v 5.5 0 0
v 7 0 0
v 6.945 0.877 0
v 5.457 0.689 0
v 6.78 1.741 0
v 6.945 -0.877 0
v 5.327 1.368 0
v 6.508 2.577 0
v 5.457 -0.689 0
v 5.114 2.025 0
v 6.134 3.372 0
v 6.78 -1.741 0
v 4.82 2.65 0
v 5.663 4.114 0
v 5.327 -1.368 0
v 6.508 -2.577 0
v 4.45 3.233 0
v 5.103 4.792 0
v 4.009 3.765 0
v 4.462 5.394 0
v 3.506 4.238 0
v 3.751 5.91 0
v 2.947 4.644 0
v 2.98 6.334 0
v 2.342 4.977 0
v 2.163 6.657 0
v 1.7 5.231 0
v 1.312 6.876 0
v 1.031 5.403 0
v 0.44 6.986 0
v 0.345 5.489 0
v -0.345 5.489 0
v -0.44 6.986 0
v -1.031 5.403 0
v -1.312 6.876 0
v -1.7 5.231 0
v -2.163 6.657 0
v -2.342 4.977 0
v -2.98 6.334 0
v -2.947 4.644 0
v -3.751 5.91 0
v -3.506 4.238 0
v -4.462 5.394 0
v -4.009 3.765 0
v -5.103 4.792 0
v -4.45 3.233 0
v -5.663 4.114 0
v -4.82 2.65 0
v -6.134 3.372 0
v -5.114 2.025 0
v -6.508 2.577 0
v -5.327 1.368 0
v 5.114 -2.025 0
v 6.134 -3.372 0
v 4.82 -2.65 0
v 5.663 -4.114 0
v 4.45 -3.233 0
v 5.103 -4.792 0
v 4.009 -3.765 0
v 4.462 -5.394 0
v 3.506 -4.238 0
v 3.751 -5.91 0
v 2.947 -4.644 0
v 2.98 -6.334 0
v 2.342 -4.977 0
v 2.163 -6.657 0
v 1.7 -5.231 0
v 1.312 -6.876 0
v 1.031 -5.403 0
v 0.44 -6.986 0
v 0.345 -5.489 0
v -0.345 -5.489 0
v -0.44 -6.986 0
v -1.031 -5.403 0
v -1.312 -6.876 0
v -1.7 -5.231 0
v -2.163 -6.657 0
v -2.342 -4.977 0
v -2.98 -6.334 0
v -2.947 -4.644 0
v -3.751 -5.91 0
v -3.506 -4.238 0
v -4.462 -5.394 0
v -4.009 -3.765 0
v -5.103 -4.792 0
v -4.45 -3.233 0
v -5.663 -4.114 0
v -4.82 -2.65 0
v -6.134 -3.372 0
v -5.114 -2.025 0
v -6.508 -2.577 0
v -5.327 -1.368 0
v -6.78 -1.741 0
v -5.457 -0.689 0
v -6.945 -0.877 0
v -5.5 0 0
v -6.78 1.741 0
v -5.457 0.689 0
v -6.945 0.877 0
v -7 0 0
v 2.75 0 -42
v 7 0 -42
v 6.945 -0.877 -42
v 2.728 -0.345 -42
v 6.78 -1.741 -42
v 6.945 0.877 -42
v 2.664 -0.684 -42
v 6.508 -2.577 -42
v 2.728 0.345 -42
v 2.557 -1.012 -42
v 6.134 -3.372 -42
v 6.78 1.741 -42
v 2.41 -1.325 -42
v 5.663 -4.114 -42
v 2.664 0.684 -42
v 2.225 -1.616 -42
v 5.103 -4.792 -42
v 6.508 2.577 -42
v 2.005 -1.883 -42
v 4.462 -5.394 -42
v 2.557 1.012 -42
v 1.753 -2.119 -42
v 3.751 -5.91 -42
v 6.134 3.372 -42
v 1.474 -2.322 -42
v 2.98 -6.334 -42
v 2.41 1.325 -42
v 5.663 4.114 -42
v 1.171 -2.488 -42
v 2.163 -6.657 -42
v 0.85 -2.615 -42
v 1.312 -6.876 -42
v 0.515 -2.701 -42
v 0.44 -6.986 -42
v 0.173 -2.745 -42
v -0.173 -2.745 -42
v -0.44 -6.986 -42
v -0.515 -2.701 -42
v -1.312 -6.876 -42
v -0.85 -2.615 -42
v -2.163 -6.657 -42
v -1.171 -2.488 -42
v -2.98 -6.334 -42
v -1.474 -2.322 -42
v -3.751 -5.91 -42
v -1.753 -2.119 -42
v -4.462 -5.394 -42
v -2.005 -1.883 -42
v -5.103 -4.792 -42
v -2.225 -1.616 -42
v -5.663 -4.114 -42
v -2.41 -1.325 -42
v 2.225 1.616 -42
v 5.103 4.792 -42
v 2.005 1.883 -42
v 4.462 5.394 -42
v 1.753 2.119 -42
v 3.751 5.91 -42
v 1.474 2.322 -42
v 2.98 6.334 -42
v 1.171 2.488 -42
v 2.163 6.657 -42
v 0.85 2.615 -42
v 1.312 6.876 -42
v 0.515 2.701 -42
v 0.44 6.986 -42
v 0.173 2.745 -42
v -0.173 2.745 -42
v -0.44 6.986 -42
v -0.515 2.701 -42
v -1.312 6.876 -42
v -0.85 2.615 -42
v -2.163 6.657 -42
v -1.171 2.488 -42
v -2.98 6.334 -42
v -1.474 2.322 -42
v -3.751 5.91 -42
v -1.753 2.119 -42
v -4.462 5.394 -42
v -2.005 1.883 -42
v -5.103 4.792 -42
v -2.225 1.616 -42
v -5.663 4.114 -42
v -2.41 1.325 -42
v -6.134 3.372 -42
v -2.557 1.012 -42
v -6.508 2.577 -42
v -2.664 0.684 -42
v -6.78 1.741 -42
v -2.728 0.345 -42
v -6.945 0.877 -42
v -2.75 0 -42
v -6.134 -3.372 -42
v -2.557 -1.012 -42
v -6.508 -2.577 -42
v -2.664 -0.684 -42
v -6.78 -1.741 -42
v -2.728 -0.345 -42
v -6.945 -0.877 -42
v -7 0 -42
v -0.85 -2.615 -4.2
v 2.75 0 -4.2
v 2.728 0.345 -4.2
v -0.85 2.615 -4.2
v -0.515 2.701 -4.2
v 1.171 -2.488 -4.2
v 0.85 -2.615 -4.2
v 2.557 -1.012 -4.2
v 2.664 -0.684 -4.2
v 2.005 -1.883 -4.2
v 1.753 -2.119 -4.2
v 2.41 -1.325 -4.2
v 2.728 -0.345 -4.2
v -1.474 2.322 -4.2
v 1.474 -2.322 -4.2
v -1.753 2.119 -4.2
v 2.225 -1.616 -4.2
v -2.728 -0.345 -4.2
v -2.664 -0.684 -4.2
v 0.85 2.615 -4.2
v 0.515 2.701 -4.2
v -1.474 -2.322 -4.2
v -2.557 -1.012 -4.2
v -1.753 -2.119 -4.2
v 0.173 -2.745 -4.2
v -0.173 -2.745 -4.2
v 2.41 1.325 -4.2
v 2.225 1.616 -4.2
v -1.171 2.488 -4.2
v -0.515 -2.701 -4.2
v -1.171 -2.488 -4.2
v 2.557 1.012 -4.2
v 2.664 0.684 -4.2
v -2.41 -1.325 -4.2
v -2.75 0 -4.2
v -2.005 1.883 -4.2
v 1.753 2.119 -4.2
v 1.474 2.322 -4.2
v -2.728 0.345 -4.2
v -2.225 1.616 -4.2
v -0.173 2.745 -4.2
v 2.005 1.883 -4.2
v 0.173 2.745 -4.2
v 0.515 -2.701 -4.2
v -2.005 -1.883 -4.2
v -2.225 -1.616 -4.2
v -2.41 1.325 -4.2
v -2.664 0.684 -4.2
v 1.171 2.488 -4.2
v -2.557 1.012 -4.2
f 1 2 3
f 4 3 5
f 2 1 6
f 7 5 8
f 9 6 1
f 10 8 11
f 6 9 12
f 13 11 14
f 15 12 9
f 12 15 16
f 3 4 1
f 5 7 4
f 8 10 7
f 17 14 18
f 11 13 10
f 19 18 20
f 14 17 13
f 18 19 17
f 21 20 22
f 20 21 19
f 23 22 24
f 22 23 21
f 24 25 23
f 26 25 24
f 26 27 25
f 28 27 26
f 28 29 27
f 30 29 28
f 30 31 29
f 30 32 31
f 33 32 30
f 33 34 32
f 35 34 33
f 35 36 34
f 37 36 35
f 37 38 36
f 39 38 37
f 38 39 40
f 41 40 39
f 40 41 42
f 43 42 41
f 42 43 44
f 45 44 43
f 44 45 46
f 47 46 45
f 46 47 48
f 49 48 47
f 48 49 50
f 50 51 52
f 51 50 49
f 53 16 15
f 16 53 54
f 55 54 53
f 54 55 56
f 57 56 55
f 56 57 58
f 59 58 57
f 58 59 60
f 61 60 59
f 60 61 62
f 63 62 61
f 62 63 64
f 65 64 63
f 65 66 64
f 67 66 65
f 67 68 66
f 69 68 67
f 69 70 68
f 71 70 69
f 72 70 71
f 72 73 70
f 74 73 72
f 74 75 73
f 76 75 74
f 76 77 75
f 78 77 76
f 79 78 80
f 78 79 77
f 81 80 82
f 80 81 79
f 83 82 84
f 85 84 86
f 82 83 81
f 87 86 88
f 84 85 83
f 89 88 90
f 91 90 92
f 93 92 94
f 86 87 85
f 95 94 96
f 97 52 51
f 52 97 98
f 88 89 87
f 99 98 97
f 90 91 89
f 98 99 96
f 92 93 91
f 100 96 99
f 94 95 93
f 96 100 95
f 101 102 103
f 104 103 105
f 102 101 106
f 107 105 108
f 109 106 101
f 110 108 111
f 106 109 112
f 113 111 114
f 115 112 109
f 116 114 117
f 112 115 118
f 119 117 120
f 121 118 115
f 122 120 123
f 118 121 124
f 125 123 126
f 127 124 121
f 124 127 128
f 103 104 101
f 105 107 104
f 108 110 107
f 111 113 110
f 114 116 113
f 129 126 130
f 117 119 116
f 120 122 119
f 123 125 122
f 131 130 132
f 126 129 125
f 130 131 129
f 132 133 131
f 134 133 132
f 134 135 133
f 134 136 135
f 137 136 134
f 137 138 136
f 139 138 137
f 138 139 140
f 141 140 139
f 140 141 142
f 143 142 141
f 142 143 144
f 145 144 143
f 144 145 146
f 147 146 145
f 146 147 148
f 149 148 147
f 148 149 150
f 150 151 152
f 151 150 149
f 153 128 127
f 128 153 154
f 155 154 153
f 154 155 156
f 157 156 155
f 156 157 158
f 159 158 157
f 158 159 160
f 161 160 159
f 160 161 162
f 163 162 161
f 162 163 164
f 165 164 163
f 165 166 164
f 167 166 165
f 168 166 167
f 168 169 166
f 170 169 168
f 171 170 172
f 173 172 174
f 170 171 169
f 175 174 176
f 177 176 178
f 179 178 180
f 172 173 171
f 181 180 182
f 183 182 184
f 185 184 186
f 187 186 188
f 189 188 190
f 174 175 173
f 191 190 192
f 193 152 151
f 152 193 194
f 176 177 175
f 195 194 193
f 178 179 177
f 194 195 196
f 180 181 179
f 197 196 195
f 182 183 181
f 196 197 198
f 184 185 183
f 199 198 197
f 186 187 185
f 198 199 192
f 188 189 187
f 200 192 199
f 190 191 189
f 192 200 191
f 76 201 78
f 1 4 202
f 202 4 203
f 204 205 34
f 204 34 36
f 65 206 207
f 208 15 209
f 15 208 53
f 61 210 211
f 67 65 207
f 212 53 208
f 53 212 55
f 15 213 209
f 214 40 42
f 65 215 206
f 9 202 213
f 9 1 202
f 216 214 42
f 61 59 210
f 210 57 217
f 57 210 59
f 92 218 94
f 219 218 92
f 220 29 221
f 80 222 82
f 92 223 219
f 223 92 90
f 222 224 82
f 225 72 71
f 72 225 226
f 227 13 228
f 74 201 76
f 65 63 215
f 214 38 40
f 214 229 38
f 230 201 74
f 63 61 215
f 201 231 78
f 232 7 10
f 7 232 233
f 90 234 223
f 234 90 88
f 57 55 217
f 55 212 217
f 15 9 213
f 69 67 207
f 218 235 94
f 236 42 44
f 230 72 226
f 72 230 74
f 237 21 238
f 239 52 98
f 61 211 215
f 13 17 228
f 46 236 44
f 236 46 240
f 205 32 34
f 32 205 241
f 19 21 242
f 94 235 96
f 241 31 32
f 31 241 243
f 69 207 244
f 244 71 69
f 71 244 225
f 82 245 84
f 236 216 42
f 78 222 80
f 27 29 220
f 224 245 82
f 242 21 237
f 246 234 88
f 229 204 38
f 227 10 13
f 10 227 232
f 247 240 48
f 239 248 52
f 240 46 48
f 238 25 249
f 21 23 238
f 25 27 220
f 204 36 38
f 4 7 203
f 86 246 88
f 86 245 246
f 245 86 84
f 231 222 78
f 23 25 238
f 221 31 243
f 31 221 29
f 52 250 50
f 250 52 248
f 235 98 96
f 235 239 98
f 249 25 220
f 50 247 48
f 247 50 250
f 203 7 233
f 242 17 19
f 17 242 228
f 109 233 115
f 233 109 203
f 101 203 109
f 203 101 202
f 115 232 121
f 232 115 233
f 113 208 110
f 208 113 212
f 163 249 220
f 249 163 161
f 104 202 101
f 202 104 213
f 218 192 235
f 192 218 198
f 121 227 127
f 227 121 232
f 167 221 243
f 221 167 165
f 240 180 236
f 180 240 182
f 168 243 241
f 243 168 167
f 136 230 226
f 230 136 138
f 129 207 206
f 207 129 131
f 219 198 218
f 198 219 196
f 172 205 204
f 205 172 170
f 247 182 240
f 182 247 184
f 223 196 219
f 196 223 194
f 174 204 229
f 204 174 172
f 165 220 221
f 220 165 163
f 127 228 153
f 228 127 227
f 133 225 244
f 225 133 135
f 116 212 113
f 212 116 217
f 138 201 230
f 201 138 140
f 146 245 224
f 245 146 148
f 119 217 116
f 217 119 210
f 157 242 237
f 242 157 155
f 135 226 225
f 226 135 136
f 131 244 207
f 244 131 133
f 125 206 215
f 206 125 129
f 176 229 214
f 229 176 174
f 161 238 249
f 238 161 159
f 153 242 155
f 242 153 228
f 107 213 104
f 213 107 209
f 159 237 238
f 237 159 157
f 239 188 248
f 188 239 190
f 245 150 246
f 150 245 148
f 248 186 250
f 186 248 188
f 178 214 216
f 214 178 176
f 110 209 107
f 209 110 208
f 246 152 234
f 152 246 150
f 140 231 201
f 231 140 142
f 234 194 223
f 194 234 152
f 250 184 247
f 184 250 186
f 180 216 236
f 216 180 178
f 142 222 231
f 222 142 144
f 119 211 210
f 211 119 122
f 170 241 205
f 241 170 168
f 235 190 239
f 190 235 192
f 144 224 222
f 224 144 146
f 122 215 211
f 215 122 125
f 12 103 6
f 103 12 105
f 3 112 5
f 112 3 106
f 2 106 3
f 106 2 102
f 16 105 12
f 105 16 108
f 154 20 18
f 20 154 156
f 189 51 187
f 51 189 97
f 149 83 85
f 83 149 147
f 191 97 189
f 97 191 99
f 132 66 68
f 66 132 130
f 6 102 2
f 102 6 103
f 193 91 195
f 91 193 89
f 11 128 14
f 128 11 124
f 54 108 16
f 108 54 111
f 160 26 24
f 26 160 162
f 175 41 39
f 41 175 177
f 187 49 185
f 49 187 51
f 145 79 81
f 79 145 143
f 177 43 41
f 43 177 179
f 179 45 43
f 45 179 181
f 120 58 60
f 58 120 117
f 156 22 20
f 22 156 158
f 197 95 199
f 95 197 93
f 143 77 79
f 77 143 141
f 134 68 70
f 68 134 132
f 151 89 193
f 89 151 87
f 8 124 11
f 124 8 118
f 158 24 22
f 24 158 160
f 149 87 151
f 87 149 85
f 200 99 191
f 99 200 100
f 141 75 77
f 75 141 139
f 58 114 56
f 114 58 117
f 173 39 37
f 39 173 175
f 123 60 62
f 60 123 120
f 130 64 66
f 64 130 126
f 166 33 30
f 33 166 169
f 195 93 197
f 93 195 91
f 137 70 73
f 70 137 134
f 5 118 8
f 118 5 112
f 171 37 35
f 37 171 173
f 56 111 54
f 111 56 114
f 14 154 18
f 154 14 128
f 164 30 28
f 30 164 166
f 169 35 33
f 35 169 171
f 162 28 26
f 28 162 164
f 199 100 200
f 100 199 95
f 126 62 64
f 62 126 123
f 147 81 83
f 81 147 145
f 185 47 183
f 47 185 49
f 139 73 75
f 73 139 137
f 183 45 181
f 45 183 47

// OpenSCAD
$fn = 50;


difference() {
	union() {
		translate(v = [0, 0, -42.0000000000]) {
			cylinder(h = 42, r = 7.0000000000);
		}
		cylinder(h = 0, r = 17.0000000000);
	}
	union() {
		translate(v = [0, 0, 0]) {
			rotate(a = [0, 0, 0]) {
				difference() {
					union() {
						#translate(v = [0, 0, -42.0000000000]) {
							cylinder(h = 42, r = 2.2500000000);
						}
						#translate(v = [0, 0, -4.2000000000]) {
							cylinder(h = 4.2000000000, r1 = 2.7500000000, r2 = 5.5000000000);
						}
						#translate(v = [0, 0, -42.0000000000]) {
							cylinder(h = 42, r = 2.7500000000);
						}
						#translate(v = [0, 0, -42.0000000000]) {
							cylinder(h = 42, r = 2.2500000000);
						}
					}
					union();
				}
			}
		}
	}
}
